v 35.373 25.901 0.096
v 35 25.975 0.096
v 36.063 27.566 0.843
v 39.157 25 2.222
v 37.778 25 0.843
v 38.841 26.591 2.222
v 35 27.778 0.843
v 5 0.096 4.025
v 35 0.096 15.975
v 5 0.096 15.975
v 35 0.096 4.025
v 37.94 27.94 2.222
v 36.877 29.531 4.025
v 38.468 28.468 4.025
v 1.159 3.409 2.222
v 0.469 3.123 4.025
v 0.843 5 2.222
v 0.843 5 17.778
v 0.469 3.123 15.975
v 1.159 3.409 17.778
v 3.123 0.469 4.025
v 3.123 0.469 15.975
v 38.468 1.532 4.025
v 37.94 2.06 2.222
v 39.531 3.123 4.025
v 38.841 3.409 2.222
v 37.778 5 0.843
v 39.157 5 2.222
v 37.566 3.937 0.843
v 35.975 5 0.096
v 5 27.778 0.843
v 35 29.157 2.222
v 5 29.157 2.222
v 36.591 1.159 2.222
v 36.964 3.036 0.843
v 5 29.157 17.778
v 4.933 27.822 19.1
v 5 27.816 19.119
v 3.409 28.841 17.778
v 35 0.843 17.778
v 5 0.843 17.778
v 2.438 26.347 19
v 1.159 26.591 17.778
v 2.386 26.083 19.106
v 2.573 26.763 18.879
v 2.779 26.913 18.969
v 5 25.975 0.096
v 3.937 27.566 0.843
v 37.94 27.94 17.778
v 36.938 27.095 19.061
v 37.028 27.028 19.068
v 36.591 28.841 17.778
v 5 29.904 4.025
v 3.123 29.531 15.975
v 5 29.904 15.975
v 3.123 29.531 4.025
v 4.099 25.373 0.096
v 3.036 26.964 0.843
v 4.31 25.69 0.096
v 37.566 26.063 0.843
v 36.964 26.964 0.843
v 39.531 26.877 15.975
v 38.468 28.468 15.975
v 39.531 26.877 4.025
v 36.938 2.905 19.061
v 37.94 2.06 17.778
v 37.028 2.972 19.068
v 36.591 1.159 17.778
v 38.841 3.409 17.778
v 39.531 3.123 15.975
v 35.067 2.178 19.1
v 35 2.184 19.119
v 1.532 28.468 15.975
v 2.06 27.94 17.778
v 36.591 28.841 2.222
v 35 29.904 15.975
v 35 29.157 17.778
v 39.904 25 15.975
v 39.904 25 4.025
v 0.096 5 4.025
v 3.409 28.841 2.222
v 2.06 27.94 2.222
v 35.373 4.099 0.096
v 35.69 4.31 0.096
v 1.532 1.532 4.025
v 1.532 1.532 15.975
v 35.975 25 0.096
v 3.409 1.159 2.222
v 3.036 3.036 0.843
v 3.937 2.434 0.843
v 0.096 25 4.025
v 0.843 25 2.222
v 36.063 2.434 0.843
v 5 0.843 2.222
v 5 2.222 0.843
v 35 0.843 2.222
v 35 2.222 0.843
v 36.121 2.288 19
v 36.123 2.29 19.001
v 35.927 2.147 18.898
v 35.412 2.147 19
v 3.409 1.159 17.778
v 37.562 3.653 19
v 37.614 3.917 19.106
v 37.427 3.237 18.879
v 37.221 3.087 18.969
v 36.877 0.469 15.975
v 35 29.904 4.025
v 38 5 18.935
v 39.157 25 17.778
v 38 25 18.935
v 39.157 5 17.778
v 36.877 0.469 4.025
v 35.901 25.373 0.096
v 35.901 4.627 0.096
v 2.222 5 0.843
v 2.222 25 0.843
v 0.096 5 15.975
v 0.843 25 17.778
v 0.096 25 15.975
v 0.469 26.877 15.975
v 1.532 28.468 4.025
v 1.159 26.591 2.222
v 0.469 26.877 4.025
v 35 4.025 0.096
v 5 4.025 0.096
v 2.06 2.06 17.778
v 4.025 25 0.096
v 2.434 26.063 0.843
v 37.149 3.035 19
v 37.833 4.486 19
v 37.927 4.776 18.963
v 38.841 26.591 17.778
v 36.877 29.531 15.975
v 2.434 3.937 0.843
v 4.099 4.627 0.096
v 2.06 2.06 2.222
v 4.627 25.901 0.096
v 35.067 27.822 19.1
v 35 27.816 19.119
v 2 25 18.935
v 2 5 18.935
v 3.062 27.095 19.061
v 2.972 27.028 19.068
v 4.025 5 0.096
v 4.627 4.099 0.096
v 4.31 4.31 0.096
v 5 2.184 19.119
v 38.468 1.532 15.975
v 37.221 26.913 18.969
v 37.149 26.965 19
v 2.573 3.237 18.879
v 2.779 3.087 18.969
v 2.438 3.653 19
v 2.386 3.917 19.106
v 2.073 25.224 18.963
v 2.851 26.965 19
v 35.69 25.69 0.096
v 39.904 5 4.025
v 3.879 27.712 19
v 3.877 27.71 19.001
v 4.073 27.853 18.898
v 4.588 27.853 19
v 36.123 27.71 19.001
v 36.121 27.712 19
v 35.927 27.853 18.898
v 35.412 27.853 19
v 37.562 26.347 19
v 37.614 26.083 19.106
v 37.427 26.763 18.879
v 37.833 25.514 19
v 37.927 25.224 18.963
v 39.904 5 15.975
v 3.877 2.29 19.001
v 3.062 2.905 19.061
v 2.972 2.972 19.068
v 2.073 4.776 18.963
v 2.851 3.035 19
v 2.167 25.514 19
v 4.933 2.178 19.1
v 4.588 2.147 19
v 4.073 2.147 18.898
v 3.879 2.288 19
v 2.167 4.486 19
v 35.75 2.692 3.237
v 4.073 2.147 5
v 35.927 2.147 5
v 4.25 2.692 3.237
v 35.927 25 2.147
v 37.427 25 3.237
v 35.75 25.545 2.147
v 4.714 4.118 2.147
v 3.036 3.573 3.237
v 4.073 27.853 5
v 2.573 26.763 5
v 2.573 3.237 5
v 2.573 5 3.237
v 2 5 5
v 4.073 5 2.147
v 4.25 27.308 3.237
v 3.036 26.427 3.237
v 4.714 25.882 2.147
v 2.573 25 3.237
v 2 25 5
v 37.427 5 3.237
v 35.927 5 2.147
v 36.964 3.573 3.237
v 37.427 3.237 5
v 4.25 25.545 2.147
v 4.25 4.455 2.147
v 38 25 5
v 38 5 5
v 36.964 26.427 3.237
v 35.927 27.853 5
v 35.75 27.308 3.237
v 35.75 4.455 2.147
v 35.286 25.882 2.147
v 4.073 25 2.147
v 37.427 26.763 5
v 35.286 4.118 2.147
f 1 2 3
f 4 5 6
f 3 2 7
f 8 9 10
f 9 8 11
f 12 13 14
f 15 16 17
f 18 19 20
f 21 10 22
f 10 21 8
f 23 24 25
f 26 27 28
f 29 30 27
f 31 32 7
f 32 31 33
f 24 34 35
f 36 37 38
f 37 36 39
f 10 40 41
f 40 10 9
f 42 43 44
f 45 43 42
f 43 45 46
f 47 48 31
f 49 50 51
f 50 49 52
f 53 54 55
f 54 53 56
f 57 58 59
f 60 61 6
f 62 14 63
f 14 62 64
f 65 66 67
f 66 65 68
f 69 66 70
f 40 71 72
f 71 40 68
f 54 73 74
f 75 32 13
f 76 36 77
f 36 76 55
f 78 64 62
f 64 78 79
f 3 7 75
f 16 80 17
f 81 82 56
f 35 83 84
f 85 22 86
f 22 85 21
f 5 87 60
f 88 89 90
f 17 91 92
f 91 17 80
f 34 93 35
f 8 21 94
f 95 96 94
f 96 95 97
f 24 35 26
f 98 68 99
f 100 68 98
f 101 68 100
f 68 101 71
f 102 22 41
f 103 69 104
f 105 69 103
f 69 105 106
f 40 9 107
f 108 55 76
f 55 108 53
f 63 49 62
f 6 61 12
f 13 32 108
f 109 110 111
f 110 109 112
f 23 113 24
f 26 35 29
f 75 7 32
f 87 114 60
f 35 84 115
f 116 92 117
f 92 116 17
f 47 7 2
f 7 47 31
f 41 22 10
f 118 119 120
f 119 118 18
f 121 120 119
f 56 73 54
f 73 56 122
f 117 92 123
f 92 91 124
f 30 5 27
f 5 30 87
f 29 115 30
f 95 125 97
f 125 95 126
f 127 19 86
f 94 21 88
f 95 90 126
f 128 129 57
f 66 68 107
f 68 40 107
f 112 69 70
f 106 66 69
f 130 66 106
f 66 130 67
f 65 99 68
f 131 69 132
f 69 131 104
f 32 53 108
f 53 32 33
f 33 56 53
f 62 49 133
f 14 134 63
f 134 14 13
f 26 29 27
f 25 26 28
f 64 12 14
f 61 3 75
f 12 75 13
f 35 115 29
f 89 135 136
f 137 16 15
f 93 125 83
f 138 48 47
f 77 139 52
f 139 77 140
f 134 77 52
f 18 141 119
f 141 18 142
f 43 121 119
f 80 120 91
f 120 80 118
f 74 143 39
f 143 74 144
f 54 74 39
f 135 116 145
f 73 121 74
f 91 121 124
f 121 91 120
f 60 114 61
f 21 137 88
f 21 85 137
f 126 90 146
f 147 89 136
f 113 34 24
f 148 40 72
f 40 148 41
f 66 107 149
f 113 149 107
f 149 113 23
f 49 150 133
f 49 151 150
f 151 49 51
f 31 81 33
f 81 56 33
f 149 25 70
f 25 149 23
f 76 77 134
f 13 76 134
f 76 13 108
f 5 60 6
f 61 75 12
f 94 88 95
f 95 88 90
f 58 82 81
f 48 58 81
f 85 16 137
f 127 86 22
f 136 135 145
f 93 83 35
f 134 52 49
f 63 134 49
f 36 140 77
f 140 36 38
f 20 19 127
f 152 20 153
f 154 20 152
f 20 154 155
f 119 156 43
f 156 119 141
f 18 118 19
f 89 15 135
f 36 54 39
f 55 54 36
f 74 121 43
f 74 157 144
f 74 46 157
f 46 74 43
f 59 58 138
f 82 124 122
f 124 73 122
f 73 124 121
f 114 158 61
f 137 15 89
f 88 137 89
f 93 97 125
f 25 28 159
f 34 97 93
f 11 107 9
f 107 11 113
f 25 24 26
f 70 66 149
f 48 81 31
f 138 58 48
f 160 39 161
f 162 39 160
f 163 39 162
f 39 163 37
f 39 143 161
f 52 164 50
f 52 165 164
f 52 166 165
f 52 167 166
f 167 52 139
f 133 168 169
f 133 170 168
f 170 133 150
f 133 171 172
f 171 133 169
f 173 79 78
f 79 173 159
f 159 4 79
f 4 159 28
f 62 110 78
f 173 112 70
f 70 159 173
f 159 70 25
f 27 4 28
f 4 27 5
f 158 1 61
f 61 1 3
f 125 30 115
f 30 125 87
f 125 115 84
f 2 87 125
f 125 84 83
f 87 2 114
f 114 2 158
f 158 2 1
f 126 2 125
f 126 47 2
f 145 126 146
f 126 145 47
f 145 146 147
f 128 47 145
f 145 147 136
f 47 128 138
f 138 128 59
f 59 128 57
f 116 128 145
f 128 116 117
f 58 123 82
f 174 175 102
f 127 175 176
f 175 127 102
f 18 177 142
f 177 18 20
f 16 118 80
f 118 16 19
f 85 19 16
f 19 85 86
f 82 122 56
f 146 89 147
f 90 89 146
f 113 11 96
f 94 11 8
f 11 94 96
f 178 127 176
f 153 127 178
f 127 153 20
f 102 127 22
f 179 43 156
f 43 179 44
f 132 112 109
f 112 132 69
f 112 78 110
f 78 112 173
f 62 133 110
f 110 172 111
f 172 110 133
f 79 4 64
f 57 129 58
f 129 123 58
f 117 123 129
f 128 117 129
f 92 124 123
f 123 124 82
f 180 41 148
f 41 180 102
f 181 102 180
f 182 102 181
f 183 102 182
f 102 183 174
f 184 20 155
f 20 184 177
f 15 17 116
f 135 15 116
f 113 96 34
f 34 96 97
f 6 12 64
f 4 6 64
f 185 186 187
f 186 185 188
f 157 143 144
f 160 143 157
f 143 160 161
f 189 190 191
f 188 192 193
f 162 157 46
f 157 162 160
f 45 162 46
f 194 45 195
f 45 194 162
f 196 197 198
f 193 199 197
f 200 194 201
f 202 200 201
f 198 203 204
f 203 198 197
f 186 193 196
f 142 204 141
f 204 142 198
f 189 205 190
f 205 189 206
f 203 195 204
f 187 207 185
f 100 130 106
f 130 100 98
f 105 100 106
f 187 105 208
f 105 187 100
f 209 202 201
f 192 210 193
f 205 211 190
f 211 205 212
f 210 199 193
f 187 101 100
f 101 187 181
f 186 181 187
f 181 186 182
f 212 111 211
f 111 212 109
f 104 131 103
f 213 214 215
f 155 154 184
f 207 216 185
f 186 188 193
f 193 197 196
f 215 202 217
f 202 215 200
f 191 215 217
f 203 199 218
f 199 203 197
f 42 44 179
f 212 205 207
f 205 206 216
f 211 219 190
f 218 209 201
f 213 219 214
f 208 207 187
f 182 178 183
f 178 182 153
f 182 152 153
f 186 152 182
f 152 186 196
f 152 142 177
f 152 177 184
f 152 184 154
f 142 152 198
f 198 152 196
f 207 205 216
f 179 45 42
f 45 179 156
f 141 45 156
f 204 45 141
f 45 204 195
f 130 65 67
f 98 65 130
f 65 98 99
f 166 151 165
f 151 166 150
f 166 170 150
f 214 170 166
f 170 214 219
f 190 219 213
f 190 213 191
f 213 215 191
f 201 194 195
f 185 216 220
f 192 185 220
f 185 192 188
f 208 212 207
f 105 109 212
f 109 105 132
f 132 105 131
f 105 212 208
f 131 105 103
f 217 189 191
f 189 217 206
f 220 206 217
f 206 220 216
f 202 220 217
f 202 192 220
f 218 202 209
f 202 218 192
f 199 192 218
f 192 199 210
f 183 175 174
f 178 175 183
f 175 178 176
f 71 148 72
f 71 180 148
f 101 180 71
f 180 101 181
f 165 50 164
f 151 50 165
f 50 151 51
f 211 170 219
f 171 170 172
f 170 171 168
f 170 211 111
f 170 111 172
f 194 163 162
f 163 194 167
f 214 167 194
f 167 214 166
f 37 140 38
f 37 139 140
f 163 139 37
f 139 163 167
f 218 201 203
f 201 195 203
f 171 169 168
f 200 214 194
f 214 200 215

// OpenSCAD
// ScadPad demo: a parametric rounded box.
// Open the Customizer tab to tweak these values with sliders.

/* [Box] */
// Outer width
width = 40; // [10:100]
// Outer depth
depth = 30; // [10:100]
// Outer height
height = 20; // [5:80]
// Corner radius
radius = 5; // [0.5:0.5:10]

/* [Lid] */
// Cut the box open?
open_top = true;
// Wall thickness
wall = 2; // [1:0.5:6]

/* [Style] */
// Surface finish
style = "rounded"; // [rounded, sharp]

/* [Hidden] */
eps = 0.01;

module shell(w, d, h, r) {
    if (style == "rounded") {
        hull()
            for (x = [r, w - r], y = [r, d - r], z = [r, h - r])
                translate([x, y, z]) sphere(r);
    } else {
        cube([w, d, h]);
    }
}

difference() {
    shell(width, depth, height, radius);
    if (open_top) {
        translate([wall, wall, wall])
            shell(width - 2*wall, depth - 2*wall, height, max(radius - wall, 0.5));
    }
}
